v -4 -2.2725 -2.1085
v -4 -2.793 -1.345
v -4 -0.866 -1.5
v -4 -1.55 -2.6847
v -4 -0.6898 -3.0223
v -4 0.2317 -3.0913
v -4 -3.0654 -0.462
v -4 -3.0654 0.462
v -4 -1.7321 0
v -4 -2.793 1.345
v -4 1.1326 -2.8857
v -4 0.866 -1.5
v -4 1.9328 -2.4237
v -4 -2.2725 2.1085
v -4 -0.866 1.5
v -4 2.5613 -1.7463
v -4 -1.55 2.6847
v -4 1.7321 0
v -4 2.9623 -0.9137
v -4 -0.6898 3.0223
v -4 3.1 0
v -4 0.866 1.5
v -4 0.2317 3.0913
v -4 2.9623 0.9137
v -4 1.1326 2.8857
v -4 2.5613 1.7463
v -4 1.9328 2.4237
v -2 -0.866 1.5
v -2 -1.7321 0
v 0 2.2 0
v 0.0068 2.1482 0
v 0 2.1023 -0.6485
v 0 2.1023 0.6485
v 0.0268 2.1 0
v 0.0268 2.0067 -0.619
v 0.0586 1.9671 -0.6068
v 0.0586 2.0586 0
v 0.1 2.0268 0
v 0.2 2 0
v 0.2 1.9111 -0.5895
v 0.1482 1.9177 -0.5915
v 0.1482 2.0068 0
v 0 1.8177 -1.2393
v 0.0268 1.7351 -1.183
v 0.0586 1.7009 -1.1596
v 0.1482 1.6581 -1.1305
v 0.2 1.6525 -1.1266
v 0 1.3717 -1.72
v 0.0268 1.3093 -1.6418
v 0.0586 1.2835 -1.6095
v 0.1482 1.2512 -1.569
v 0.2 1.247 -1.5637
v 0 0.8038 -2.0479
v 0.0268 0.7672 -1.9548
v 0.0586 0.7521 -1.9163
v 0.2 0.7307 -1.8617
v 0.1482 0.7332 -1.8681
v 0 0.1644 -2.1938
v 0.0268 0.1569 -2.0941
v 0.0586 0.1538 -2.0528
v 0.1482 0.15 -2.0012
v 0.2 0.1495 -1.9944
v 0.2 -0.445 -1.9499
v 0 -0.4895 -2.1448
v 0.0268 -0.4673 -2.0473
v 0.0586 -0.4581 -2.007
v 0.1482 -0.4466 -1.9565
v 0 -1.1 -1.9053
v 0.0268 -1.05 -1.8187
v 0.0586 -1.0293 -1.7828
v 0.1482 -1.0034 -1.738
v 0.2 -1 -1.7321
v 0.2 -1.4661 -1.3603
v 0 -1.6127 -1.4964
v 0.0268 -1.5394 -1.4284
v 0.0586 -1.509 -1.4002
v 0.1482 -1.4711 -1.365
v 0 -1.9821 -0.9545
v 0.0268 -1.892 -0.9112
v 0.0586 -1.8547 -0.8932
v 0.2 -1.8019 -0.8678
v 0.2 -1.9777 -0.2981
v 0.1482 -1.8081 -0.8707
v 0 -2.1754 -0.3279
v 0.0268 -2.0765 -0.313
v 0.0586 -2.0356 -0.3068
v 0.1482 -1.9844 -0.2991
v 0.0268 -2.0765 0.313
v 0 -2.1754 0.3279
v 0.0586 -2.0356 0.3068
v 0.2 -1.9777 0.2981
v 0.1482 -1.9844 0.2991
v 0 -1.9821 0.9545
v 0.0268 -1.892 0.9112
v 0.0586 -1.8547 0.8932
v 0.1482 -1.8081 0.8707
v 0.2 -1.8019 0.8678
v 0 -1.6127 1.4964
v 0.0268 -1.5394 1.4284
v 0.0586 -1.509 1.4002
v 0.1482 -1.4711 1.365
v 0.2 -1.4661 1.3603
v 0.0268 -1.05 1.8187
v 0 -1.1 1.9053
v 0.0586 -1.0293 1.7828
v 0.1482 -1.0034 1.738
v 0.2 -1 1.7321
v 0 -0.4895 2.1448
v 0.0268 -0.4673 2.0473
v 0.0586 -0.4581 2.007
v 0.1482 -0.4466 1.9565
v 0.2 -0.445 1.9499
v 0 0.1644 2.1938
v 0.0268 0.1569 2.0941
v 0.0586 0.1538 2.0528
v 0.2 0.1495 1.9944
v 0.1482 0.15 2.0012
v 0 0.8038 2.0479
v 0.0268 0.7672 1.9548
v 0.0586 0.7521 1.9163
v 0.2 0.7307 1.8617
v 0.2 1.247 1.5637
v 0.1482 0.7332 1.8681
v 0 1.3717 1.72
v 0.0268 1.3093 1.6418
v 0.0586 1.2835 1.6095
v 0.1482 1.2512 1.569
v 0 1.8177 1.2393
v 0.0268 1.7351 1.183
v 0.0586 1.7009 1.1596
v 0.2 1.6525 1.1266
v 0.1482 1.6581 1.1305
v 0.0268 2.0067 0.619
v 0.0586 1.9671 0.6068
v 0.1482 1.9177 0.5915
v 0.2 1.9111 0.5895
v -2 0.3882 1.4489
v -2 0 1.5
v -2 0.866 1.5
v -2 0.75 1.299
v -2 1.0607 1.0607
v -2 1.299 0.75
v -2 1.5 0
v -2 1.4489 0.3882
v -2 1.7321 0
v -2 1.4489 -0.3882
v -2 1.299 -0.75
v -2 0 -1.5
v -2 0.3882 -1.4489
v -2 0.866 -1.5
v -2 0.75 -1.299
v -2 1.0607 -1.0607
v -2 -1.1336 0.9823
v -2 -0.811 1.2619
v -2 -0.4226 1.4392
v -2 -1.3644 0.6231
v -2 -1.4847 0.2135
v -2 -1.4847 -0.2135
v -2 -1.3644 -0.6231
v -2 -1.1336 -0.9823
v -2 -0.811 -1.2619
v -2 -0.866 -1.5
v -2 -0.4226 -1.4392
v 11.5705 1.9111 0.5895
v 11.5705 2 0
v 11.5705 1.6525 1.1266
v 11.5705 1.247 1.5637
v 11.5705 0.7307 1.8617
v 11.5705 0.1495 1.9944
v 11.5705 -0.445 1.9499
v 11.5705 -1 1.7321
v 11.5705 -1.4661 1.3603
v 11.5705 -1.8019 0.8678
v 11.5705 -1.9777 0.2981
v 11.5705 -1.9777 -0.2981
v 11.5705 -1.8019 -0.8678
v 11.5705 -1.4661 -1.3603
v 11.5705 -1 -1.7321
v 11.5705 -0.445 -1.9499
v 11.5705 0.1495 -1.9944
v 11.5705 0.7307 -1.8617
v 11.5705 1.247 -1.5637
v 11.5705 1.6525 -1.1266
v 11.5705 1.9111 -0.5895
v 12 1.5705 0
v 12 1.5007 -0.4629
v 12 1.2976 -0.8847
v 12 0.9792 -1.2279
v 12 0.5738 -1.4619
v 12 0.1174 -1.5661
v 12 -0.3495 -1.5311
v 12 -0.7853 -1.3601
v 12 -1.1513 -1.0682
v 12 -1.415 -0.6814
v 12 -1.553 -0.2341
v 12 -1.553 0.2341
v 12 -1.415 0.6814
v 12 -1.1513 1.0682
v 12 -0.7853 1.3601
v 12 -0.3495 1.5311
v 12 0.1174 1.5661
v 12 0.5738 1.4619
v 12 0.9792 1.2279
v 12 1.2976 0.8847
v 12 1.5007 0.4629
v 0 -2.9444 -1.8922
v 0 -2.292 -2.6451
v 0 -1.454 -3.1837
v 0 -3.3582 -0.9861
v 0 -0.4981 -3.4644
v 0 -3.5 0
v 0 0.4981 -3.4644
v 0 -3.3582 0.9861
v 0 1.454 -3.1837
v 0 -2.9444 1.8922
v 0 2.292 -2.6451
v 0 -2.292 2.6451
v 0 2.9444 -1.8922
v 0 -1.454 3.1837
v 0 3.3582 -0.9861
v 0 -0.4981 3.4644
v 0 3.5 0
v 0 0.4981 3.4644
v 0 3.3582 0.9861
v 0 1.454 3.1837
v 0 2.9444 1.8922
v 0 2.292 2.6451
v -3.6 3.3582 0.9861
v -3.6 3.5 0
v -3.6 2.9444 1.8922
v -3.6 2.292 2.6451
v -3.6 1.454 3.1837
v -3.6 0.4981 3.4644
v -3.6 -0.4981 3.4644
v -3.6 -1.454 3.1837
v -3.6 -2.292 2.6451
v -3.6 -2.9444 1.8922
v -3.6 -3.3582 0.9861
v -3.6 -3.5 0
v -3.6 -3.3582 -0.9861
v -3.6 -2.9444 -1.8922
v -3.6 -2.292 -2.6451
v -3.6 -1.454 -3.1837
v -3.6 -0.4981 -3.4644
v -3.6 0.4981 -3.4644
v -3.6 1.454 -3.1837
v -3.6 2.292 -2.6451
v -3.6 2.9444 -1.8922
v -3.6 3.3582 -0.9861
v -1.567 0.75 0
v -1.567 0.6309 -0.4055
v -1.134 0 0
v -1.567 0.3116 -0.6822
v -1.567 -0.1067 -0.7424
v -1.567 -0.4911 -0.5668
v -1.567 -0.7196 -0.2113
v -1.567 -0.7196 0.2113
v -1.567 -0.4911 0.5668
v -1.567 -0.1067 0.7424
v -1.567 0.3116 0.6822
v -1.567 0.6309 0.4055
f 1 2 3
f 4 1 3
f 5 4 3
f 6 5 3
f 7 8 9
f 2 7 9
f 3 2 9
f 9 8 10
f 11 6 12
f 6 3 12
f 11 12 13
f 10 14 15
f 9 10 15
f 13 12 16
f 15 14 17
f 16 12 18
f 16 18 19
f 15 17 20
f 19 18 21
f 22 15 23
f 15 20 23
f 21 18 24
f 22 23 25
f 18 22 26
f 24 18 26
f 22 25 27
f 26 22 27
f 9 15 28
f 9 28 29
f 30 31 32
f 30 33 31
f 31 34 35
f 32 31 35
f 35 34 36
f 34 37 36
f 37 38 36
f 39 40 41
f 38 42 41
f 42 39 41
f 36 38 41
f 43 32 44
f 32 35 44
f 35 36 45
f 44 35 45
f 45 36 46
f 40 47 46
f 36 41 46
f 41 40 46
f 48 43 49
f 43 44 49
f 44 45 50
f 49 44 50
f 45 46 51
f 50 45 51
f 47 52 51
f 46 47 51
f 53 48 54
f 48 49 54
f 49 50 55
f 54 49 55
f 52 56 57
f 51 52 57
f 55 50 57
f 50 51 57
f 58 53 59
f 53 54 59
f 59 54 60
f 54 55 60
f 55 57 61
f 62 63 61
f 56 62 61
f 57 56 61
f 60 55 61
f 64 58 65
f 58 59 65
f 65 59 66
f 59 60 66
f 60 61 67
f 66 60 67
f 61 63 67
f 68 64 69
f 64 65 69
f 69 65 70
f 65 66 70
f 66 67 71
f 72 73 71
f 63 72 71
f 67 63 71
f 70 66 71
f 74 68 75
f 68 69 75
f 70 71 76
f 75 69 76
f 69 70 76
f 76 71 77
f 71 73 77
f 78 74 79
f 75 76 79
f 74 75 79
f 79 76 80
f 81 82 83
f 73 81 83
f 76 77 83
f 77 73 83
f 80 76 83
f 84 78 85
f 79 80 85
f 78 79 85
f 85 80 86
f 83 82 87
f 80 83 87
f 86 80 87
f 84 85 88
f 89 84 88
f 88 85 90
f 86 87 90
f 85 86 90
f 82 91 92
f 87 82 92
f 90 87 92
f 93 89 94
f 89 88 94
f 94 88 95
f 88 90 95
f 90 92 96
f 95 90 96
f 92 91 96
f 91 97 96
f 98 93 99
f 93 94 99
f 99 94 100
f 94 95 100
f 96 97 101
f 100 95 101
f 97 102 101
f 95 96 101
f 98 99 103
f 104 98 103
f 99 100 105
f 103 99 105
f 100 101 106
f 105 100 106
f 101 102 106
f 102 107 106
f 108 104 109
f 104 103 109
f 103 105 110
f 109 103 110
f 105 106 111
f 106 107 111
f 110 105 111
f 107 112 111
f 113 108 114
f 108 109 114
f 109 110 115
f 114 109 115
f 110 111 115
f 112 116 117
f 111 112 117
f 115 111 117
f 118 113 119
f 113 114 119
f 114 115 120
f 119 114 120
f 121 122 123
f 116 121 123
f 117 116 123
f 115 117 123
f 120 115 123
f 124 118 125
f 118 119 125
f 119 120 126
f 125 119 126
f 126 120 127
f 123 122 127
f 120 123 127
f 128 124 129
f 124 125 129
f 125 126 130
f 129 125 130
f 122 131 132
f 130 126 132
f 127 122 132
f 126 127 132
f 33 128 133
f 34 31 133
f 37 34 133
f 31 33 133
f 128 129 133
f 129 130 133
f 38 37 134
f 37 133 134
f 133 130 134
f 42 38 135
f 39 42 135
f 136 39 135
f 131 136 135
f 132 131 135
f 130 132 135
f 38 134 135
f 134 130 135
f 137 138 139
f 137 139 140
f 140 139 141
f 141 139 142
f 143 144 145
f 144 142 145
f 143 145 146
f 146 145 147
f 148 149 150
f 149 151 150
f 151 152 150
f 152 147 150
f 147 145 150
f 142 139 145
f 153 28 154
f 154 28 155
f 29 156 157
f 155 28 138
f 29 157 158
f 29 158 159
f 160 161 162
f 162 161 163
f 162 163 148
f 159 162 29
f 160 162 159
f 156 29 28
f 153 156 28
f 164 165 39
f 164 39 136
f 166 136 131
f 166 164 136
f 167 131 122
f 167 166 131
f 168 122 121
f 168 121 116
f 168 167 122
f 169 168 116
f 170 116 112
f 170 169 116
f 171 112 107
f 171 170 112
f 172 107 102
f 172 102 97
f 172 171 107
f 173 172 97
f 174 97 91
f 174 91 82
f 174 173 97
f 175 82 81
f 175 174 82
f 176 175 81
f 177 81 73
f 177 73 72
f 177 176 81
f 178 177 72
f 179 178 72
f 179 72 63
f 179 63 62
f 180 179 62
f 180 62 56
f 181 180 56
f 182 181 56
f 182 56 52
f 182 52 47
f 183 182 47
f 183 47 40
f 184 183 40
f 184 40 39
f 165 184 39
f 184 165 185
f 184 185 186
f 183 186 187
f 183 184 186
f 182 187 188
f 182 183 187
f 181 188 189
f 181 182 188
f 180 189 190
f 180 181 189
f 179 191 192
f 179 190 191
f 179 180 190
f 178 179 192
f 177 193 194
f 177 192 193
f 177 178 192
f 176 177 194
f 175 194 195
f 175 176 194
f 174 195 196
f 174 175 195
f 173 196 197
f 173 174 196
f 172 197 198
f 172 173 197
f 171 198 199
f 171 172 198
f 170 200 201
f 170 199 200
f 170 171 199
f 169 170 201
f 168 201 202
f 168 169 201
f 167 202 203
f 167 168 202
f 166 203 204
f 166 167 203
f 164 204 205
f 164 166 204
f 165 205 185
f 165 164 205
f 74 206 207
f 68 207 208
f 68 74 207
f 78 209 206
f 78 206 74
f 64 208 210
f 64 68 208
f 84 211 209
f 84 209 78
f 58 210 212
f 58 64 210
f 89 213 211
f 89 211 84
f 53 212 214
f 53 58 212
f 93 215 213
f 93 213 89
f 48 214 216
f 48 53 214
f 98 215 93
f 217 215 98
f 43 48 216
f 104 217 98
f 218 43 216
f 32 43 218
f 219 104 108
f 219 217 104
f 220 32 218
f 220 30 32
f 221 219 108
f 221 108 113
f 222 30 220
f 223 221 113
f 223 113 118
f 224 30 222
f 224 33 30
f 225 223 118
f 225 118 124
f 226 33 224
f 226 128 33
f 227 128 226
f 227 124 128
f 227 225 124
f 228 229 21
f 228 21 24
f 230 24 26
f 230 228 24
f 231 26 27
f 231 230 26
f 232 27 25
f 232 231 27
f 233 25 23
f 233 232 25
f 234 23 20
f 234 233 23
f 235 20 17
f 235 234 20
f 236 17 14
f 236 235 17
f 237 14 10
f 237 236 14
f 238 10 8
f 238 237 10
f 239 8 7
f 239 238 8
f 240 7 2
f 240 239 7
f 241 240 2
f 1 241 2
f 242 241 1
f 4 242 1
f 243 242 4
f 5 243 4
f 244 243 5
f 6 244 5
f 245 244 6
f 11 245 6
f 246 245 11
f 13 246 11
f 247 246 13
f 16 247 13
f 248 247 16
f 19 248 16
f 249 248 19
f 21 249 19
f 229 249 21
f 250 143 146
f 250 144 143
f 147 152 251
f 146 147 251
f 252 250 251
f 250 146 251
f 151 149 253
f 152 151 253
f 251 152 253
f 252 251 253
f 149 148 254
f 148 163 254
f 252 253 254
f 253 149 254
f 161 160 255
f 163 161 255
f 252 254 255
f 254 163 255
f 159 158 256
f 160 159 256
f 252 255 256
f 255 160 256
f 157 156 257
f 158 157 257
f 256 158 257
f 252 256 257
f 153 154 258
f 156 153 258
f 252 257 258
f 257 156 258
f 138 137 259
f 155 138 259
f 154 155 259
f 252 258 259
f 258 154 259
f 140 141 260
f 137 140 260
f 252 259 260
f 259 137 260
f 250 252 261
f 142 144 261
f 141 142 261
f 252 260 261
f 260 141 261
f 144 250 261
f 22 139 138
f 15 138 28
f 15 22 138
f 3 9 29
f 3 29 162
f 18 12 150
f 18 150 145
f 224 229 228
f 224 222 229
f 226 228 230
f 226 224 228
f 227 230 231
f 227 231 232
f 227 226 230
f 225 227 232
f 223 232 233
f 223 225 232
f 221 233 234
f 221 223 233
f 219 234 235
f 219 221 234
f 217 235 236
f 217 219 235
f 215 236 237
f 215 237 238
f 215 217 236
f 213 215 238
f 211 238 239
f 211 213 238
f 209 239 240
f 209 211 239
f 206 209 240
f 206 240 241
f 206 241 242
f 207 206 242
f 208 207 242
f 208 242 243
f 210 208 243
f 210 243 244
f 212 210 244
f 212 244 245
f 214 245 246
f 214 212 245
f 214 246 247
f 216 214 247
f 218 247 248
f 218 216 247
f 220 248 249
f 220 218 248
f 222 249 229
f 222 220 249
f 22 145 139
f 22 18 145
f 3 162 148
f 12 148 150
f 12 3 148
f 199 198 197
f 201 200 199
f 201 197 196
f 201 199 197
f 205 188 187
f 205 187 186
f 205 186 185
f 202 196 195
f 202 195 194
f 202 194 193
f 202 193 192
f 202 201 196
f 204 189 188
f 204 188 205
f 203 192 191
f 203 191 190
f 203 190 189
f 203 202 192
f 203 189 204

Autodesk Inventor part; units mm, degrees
sketch "Sketch_1" plane through (0, 0, 0) normal (0, 0, 1) x (1, 0, 0)
  line L0 (12, 0) -> (-4, 0)
  line L1 (-4, 0) -> (-4, 3.1)
  line L2 (-4, 3.1) -> (-3.6, 3.5)
  line L3 (-3.6, 3.5) -> (0, 3.5)
  line L4 (0, 3.5) -> (0, 2.2)
  arc A0 (0, 2.2) -> (0.2, 2) centre (0.2, 2.2) ccw
  line L5 (0.2, 2) -> (11.5705, 2)
  line L6 (11.5705, 2) -> (12, 1.5705)
  line L7 (12, 1.5705) -> (12, 0)
  line L8 (12, 0) -> (-4, 0)
revolve "Revolution1" add sketch "Sketch_1" angle 360 about axis through (12, 0, 0) along (1, 0, 0)
thread "Thread1" size "M4x0.7" class "6g" standard "ISO Metric profile" length 10.714
sketch "Sketch_2" plane through (-4, 0, 0) normal (1, 0, 0) x (0, 0, -1)
  line L0 (-1.5, -0.866) -> (0, -1.7321)
  line L1 (0, -1.7321) -> (1.5, -0.866)
  line L2 (1.5, -0.866) -> (1.5, 0.866)
  line L3 (1.5, 0.866) -> (0, 1.7321)
  line L4 (0, 1.7321) -> (-1.5, 0.866)
  line L5 (-1.5, 0.866) -> (-1.5, -0.866)
extrude "Extrusion1" cut sketch "Sketch_2" along normal blind 2
sketch "Sketch_5" plane through (0, 0, 0) normal (0, 0, 1) x (1, 0, 0)
  line L0 (-1.134, 0) -> (-2, 0)
  line L1 (-2, 0) -> (-2, 1.5)
  line L2 (-2, 1.5) -> (-1.134, 0)
  line L3 (-1.134, 0) -> (-2, 0)
revolve "Revolution2" cut sketch "Sketch_5" angle 360 about axis through (-1.134, 0, 0) along (1, 0, 0)
ref_plane "SCW_XY" through (0, 0, 0) normal (1, 0, 0) x (0, 0, -1)
ref_plane "SCW_YZ" through (0, 0, 0) normal (0, 0, -1) x (0, 1, 0)
ref_plane "SCW_ZX" through (0, 0, 0) normal (0, 1, 0) x (1, 0, 0)
properties part number "M4-12_bo2"
